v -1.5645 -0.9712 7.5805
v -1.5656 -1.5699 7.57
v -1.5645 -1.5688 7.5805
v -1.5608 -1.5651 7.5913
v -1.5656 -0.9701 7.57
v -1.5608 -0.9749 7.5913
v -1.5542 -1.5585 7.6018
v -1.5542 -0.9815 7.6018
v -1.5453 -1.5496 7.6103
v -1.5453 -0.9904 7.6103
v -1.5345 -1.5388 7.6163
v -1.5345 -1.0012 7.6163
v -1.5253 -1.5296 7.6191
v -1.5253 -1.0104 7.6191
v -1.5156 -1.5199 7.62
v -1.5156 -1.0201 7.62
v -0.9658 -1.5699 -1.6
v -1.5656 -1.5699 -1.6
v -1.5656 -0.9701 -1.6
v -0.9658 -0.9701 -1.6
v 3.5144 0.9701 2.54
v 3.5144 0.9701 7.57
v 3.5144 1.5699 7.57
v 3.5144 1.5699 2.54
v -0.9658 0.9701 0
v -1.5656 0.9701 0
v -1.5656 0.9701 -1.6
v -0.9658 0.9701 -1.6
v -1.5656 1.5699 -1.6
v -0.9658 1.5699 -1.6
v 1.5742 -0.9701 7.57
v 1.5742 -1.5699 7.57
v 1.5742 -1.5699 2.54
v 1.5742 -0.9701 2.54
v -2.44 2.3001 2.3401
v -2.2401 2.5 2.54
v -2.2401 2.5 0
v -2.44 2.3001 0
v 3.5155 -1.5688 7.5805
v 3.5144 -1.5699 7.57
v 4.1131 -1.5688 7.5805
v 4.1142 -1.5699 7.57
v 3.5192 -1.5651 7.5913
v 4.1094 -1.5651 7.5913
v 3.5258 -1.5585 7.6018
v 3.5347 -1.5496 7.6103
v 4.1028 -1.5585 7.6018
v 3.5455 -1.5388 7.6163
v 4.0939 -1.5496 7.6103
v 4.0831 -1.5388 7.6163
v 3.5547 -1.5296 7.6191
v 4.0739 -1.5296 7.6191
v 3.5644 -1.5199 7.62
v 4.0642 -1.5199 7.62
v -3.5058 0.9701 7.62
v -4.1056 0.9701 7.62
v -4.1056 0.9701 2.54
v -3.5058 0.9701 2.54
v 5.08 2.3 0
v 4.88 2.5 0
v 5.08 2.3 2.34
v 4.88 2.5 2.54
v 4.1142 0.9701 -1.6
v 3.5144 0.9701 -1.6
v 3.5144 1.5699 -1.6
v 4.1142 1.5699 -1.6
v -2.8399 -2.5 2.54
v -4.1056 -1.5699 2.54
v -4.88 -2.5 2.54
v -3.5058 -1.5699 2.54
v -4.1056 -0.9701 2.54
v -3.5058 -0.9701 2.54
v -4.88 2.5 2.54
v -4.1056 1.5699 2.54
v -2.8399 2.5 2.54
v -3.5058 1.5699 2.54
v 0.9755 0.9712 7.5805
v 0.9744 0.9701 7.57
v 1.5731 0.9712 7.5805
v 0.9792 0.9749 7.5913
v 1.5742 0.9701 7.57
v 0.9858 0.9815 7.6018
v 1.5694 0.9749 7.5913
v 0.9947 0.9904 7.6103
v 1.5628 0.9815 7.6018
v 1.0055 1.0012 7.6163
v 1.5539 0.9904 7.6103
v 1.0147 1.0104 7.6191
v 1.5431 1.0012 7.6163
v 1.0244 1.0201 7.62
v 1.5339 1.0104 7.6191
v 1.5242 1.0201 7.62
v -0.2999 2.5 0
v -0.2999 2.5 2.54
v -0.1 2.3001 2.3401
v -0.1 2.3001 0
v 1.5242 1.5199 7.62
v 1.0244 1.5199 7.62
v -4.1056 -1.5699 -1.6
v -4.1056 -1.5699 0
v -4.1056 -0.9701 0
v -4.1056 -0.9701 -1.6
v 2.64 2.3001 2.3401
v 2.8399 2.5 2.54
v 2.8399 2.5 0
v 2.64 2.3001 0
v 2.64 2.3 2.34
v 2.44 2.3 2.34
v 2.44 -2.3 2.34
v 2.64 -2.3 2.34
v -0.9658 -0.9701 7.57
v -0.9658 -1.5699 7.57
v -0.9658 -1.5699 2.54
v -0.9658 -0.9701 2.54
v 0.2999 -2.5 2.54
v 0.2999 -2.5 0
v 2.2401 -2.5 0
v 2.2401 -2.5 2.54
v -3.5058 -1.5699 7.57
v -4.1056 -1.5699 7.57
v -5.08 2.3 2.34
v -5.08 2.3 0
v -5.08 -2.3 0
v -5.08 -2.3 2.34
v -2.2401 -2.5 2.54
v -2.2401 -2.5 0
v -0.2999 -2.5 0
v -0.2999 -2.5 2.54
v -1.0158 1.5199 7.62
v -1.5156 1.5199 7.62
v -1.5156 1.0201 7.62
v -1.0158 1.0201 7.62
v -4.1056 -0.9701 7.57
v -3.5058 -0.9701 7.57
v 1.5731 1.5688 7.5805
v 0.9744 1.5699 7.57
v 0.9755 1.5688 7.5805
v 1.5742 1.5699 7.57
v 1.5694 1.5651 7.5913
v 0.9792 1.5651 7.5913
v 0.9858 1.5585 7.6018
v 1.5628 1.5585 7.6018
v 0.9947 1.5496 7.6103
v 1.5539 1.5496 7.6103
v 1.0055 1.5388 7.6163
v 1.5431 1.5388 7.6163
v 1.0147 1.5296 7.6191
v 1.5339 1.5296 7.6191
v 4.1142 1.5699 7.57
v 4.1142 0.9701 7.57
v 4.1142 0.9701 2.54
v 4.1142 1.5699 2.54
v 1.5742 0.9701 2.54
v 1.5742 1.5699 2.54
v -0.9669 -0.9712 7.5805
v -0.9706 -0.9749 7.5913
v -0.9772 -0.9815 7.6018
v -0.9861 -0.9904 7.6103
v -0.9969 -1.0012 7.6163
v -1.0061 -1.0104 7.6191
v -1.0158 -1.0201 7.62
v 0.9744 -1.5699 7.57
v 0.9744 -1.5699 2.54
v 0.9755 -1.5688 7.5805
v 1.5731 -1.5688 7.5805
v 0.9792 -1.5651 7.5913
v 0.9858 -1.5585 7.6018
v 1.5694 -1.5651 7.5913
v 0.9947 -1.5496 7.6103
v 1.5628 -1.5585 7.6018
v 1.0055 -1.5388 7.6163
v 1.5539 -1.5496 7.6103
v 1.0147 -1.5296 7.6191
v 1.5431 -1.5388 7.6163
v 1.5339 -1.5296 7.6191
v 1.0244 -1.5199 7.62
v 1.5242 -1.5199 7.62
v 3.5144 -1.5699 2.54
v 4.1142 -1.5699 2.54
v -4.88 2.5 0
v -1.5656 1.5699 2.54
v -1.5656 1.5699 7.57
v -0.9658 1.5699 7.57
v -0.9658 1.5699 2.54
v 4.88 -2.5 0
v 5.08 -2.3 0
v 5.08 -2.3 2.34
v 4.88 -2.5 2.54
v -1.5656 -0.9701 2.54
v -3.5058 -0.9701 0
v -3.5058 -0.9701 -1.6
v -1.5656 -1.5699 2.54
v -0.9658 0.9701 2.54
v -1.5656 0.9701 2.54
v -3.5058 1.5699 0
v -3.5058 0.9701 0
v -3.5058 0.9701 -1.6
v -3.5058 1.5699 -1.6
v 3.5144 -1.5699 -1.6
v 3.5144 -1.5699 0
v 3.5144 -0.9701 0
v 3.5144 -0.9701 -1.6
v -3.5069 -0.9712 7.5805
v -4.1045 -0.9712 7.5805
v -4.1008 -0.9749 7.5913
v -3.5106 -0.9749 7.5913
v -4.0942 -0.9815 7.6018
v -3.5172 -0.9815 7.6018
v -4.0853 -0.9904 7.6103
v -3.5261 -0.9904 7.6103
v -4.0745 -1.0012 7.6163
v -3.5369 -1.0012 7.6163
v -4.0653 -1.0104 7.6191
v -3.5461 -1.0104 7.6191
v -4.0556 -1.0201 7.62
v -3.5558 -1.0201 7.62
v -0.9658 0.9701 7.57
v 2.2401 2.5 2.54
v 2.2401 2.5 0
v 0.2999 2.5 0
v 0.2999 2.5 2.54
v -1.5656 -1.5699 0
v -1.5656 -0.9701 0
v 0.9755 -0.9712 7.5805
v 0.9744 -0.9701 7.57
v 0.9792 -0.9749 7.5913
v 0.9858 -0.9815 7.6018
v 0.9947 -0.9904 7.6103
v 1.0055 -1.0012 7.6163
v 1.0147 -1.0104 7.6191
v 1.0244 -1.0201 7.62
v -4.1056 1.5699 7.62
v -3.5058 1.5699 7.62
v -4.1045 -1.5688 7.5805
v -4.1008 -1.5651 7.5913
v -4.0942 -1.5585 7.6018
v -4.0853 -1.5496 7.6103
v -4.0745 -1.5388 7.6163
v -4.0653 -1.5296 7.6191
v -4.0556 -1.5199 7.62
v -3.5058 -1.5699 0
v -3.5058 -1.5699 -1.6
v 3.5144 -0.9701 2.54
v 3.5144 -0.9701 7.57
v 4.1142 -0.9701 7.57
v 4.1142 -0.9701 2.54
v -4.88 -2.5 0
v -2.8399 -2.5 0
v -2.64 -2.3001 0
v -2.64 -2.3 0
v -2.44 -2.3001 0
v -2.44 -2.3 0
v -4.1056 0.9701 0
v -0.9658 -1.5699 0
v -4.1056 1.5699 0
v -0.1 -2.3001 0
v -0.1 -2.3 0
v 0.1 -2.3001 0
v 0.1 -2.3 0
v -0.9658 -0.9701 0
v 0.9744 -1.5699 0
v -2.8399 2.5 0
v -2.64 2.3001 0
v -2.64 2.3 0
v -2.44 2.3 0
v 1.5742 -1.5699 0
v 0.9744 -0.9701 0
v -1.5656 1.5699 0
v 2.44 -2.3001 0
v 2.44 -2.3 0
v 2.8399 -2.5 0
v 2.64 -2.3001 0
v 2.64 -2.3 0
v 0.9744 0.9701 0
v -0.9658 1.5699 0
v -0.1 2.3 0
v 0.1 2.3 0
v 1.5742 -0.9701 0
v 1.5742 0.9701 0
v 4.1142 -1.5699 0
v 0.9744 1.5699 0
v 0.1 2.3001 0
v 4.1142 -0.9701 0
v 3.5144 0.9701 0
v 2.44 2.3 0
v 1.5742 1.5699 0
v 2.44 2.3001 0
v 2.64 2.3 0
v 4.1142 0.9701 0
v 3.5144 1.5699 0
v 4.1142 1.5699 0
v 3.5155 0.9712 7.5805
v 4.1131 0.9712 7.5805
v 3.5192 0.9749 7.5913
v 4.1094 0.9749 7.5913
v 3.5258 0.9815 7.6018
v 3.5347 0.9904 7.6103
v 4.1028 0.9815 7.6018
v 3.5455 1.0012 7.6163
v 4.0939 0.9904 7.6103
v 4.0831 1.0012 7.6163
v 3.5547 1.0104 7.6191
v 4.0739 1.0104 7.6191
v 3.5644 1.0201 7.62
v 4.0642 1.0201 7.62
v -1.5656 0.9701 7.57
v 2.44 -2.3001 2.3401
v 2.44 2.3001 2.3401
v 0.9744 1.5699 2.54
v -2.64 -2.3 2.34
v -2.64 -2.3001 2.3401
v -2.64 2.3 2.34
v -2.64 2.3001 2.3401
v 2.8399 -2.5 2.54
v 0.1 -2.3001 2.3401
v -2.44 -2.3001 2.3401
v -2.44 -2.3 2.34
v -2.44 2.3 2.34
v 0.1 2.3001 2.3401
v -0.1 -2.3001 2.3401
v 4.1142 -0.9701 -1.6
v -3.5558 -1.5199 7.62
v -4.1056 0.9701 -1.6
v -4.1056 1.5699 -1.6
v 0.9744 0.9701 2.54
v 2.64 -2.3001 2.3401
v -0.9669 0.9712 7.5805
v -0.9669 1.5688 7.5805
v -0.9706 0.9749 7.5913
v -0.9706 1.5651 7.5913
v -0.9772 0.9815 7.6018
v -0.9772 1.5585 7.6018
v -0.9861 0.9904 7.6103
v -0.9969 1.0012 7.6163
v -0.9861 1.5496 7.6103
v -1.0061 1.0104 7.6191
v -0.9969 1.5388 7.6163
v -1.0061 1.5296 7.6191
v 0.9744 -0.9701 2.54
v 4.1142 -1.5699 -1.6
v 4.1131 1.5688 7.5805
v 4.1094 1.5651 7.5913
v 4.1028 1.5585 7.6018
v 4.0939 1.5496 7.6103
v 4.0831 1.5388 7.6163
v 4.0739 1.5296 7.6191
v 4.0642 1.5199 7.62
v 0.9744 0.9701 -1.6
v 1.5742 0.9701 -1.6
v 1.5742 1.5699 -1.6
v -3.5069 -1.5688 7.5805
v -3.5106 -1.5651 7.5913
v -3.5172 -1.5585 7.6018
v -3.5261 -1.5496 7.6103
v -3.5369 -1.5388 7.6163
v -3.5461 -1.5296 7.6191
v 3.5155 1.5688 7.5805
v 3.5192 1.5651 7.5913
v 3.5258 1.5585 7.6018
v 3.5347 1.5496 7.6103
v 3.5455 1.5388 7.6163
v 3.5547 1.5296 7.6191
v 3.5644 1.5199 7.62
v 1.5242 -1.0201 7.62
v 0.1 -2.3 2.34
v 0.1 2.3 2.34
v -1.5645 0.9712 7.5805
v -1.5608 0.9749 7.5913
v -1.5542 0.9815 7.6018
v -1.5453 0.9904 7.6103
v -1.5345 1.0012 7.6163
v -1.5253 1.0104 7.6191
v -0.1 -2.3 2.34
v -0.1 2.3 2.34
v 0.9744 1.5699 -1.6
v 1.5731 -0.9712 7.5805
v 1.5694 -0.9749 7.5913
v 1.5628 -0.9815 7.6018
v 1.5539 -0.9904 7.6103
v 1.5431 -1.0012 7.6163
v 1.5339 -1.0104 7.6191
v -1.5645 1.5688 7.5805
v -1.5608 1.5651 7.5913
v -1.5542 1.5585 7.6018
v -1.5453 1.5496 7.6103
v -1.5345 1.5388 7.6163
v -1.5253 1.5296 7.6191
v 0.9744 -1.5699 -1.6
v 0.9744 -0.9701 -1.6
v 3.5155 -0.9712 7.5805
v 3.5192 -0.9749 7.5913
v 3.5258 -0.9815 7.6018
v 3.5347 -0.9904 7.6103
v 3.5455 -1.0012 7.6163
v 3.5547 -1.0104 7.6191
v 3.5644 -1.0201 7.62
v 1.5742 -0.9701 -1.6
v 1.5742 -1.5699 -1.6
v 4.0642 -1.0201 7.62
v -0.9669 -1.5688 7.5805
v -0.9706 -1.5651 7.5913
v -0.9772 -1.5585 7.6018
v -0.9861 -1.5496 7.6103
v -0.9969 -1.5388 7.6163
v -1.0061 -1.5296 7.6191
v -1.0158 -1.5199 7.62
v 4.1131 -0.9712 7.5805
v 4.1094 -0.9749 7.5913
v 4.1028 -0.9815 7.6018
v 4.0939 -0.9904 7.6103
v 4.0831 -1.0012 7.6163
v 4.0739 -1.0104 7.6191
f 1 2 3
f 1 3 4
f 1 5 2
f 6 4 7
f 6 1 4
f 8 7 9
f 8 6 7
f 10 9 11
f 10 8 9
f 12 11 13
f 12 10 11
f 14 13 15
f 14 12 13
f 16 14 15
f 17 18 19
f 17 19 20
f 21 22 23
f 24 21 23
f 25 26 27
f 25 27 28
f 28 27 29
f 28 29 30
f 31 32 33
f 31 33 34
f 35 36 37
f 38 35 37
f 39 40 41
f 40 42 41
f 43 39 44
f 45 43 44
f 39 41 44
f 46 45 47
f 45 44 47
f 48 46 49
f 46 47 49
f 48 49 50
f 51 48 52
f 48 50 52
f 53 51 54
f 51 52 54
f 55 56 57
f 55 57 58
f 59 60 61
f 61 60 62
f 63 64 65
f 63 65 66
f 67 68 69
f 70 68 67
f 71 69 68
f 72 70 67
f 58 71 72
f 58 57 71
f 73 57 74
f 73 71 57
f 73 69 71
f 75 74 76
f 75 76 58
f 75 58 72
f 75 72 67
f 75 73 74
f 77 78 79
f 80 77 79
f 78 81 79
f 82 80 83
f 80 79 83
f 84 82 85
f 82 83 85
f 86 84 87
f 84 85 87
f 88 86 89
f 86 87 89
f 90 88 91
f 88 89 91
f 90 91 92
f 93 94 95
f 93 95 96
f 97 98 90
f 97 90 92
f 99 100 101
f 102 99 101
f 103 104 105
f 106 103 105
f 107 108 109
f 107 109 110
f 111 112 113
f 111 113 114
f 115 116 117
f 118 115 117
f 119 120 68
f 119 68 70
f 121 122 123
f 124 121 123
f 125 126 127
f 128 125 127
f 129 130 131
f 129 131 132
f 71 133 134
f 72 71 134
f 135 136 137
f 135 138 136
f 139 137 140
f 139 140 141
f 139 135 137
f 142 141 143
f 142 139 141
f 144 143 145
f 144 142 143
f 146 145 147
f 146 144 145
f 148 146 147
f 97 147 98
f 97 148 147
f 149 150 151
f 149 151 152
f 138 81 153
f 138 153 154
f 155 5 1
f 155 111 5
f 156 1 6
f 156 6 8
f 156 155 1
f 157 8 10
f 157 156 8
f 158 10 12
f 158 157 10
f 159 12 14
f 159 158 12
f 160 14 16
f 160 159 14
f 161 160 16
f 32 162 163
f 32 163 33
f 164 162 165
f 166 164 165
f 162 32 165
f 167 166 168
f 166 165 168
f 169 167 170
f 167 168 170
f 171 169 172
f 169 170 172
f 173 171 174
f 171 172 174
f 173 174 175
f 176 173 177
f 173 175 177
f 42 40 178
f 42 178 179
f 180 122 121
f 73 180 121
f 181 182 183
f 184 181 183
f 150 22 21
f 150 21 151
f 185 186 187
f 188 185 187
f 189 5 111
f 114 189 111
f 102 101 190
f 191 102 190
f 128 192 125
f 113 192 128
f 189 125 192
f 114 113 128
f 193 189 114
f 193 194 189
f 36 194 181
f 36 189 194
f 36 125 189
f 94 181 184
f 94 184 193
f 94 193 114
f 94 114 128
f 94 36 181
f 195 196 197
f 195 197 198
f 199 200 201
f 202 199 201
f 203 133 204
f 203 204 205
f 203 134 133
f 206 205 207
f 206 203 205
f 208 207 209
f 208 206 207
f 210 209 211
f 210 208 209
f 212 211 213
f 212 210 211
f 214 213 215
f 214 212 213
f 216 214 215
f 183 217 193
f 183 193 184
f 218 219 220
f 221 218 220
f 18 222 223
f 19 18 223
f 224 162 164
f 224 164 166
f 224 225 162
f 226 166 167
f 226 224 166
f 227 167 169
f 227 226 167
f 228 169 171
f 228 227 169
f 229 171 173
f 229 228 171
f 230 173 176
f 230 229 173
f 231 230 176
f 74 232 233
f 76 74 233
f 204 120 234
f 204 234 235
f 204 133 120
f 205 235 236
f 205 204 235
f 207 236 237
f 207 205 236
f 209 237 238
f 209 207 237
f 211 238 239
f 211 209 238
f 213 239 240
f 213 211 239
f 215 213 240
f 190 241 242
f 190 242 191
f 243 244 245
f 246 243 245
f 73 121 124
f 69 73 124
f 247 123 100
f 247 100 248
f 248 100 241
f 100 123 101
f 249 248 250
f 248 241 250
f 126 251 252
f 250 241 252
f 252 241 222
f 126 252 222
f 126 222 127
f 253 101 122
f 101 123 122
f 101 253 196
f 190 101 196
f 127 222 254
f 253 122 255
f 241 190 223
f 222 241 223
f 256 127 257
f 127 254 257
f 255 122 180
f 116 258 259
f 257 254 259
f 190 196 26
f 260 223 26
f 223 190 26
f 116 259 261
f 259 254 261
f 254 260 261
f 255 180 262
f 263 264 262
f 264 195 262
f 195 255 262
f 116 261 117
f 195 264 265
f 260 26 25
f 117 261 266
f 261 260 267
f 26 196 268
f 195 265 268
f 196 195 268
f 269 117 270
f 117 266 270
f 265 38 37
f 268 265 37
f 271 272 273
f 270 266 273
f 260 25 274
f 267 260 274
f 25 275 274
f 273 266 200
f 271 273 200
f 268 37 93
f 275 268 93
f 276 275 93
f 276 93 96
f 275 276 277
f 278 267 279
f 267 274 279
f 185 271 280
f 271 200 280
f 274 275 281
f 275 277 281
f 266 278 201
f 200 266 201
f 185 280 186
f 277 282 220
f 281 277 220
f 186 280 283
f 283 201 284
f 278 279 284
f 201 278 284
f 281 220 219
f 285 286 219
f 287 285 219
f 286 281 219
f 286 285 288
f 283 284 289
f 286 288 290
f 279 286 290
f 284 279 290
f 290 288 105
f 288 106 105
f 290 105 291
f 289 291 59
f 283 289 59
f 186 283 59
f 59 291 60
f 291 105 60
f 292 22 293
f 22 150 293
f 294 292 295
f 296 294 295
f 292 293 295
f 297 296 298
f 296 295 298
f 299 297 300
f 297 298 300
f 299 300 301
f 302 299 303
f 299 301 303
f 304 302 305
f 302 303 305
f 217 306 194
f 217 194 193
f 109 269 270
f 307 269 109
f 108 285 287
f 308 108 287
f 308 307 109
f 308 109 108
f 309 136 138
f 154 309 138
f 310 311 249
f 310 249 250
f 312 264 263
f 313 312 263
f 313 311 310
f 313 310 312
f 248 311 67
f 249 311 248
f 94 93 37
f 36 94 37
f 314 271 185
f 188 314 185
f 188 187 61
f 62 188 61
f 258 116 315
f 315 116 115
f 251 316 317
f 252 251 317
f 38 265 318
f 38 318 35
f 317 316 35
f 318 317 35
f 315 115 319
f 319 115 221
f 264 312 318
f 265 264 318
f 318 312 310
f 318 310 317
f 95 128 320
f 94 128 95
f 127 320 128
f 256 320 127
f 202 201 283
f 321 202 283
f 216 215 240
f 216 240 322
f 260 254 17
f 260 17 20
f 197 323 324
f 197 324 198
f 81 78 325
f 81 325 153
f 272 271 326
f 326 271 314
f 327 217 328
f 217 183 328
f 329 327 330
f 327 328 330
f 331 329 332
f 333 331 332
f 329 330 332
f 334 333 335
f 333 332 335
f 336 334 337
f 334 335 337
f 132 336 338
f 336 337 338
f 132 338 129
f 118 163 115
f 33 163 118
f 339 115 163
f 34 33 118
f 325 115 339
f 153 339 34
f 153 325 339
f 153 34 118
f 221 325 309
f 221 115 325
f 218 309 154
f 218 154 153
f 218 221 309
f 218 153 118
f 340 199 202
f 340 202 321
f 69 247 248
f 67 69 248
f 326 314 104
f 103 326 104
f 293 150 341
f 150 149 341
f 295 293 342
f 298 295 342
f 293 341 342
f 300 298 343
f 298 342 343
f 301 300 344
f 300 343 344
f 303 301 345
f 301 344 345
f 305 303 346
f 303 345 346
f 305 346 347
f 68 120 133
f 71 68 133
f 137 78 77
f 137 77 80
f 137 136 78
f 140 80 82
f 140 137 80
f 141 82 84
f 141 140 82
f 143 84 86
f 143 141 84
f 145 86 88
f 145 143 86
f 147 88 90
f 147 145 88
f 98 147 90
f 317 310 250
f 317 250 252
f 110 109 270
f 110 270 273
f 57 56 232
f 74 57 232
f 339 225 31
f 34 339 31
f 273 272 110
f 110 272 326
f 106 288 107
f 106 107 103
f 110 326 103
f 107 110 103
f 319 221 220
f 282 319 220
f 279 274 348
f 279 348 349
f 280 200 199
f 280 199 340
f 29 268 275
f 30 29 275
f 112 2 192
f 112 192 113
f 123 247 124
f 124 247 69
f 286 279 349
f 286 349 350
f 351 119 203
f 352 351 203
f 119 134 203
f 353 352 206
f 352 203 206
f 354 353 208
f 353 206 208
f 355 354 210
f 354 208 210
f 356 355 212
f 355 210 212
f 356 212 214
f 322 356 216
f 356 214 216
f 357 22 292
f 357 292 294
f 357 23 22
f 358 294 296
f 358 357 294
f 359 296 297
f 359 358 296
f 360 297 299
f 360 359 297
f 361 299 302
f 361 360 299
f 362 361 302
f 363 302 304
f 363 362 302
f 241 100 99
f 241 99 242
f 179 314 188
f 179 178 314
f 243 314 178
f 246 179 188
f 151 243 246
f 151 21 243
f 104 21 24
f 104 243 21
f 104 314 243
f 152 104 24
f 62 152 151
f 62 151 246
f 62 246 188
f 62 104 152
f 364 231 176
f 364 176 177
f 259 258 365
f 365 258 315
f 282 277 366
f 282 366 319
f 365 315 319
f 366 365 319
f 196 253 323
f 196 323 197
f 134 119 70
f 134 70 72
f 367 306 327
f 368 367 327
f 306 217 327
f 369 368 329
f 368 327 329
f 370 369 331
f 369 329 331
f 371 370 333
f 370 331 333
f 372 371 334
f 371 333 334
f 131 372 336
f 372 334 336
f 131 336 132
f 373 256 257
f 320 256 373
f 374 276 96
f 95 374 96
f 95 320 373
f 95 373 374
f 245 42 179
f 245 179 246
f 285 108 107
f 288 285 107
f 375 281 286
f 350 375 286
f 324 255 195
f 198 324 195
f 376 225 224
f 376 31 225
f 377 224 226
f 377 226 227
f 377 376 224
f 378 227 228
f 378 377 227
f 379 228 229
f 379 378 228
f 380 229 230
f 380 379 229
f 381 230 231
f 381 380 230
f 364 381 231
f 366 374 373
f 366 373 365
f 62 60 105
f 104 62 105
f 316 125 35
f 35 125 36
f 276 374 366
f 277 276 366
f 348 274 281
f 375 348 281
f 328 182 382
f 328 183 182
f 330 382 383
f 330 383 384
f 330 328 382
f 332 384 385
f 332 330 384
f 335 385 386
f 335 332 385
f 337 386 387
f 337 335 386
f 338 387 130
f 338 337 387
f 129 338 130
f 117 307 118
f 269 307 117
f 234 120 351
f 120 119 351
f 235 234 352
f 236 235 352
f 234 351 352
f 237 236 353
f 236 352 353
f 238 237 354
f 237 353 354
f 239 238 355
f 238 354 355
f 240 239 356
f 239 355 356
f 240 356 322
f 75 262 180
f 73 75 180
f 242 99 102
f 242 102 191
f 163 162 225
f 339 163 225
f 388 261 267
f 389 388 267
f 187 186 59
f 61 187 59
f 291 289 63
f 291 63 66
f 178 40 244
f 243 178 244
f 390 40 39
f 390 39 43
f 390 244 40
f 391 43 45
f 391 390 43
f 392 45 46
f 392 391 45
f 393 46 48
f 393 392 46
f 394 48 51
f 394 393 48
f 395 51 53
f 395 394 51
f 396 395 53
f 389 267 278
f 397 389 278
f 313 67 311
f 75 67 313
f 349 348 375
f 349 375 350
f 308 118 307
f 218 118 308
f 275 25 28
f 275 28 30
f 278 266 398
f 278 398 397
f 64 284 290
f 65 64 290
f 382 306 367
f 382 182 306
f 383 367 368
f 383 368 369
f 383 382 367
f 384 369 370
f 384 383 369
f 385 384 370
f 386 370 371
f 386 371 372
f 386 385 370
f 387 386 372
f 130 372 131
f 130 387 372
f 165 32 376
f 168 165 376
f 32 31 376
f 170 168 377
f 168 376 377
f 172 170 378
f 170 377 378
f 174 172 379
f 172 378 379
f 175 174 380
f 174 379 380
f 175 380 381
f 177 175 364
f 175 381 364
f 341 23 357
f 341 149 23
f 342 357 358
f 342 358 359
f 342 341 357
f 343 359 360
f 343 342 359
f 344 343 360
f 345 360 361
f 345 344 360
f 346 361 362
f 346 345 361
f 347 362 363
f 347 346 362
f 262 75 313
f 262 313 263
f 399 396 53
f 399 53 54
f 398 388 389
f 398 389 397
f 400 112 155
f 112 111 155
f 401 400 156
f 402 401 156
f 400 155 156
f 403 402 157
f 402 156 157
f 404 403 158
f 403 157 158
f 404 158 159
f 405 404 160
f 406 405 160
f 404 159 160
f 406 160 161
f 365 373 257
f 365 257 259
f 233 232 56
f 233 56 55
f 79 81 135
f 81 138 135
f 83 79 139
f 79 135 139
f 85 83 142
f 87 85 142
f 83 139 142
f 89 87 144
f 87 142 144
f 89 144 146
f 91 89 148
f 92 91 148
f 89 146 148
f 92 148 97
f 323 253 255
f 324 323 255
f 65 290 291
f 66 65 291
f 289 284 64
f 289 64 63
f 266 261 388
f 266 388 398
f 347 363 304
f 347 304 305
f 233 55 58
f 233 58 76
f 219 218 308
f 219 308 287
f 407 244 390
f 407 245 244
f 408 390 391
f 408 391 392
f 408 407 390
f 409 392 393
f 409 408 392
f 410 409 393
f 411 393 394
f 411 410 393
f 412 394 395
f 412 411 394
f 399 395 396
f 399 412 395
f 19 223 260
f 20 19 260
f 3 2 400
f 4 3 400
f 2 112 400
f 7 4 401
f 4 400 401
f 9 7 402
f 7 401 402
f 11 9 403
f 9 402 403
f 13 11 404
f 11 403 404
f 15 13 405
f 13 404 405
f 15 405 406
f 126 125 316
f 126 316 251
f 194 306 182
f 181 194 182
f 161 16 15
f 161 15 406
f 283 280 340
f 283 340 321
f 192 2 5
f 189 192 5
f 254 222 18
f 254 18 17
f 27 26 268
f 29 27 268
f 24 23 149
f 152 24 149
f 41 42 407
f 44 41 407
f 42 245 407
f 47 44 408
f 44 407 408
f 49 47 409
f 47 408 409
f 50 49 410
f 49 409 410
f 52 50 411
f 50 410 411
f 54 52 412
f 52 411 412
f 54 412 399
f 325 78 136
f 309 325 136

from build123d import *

# Parameters (mm, degrees)
EXTRUDE_1_DEPTH             = 2.54
SKETCH_2_W                  = 0.599854391
SKETCH_2_H                  = 0.599854392
EXTRUDE_2_DEPTH             = 5.08
SKETCH_4_W                  = 0.2
SKETCH_4_H                  = 5
CUT_EXTRUDE_2_DEPTH         = 0.2
CUT_EXTRUDE_3_REACH         = 9.607
SKETCH_5_W                  = 0.2
SKETCH_5_H                  = 0.2
PATTERN_LINEAR_2_COUNT      = 3
PATTERN_LINEAR_2_PITCH      = 2.54
CHAMFER_1_SIZE              = 0.2
CHAMFER_2_SIZE              = 0.2
PATTERN_LINEAR_3_COUNT      = 4
PATTERN_LINEAR_3_PITCH      = 2.54
PATTERN_LINEAR_3_COUNT_DIR2 = 2
PATTERN_LINEAR_3_PITCH_DIR2 = 2.54
FILLET_4_R                  = 0.05
SKETCH_6_W                  = 13.31877373
SKETCH_6_H                  = 4.876948745
CUT_EXTRUDE_4_DEPTH         = 10


with BuildPart() as part:
    # 草图1 → 凸台-拉伸1 (new body)
    with BuildSketch(Plane.XY):
        Polygon((5.08, 2.5), (-5.08, 2.5), (-5.08, 0), (-5.08, -2.5), (5.08, -2.5), (5.08, 0), align=None)
    extrude(amount=EXTRUDE_1_DEPTH)

    # 草图2 → 凸台-拉伸2 (add, symmetric)
    with BuildSketch(Plane.XY.offset(2.54)):
        with Locations((-3.805698419, 1.27)):
            Rectangle(SKETCH_2_W, SKETCH_2_H)
    extrude_2 = extrude(amount=EXTRUDE_2_DEPTH, both=True)

    # 草图4 → 切除-拉伸2 (cut)
    with BuildSketch(Plane.XY.offset(2.54)):
        with Locations((-2.54, 0)):
            Rectangle(SKETCH_4_W, SKETCH_4_H)
    cut_extrude_2 = extrude(amount=-CUT_EXTRUDE_2_DEPTH, mode=Mode.SUBTRACT)

    # 草图5 → 切除-拉伸3 (cut, up to next)
    with BuildSketch(Plane.XY.offset(2.54), mode=Mode.PRIVATE) as cut_extrude_3_sk1:
        with Locations((-2.54, 2.4)):
            Rectangle(SKETCH_5_W, SKETCH_5_H)
    cut_extrude_3_tool1 = extrude(cut_extrude_3_sk1.sketch, amount=-CUT_EXTRUDE_3_REACH, mode=Mode.PRIVATE) & part.part
    # 草图5 → 切除-拉伸3 (cut, up to next)
    with BuildSketch(Plane.XY.offset(2.54), mode=Mode.PRIVATE) as cut_extrude_3_sk2:
        with Locations((-2.54, -2.4)):
            Rectangle(SKETCH_5_W, SKETCH_5_H)
    cut_extrude_3_tool2 = extrude(cut_extrude_3_sk2.sketch, amount=-CUT_EXTRUDE_3_REACH, mode=Mode.PRIVATE) & part.part
    cut_extrude_3_1 = cut_extrude_3_tool1.solids().sort_by_distance((-2.54, 2.4, 2.54))[0]
    add(cut_extrude_3_1, mode=Mode.SUBTRACT)
    cut_extrude_3_2 = cut_extrude_3_tool2.solids().sort_by_distance((-2.54, -2.4, 2.54))[0]
    add(cut_extrude_3_2, mode=Mode.SUBTRACT)
    cut_extrude_3 = cut_extrude_3_1 + cut_extrude_3_2  # 切除-拉伸3 as one shape, for the pattern or mirror that repeats it

    # 阵列(线性)2: 切除-拉伸2, 切除-拉伸3 ×3
    with Locations(*[(i * PATTERN_LINEAR_2_PITCH, 0, 0) for i in range(1, PATTERN_LINEAR_2_COUNT)]):
        add(cut_extrude_2, mode=Mode.SUBTRACT)
        add(cut_extrude_3, mode=Mode.SUBTRACT)

    # 倒角1
    chamfer_1_edges = [part.edges().sort_by_distance(p)[0] for p in [
        (5.08, -1.25, 2.54),
        (-5.08, 2.5, 1.27),
        (5.08, 2.5, 1.27),
        (5.08, -2.5, 1.27),
        (-5.08, -2.5, 1.27),
        (-5.08, -1.25, 2.54),
    ]]
    chamfer(chamfer_1_edges, length=CHAMFER_1_SIZE)

    # 倒角2
    chamfer_2_edges = [part.edges().sort_by_distance(p)[0] for p in [
        (-2.64, -2.5, 1.27),
        (2.44, -2.5, 1.27),
        (0.1, -2.5, 1.27),
        (2.64, -2.5, 1.27),
        (-0.1, -2.5, 1.27),
        (-2.44, -2.5, 1.27),
        (2.64, 0, 2.54),
        (-2.64, 0, 2.54),
        (-0.1, 0, 2.54),
        (-2.44, 0, 2.54),
        (2.44, 0, 2.54),
        (0.1, 0, 2.54),
        (2.64, 2.5, 1.27),
        (-0.1, 2.5, 1.27),
        (-2.44, 2.5, 1.27),
        (2.44, 2.5, 1.27),
        (0.1, 2.5, 1.27),
        (-2.64, 2.5, 1.27),
    ]]
    chamfer(chamfer_2_edges, length=CHAMFER_2_SIZE - 0.0001)  # a hair under: the kernel refuses the full size

    # 阵列(线性)3: Extrude 2 4 × 2
    with Locations(*[(i * PATTERN_LINEAR_3_PITCH, -j * PATTERN_LINEAR_3_PITCH_DIR2, 0) for i in range(PATTERN_LINEAR_3_COUNT) for j in range(PATTERN_LINEAR_3_COUNT_DIR2) if (i, j) != (0, 0)]):
        add(extrude_2)

    # 圆角4
    fillet_4_edges = [part.edges().sort_by_distance(p)[0] for p in [
        (-3.805698419, -0.970072804, -2.54),
        (-4.105625614, -1.27, -2.54),
        (-3.805698419, -1.569927196, -2.54),
        (-3.505771223, -1.27, -2.54),
        (-3.805698419, -0.970072804, 7.62),
        (-4.105625614, -1.27, 7.62),
        (-3.805698419, -1.569927196, 7.62),
        (-3.505771223, -1.27, 7.62),
        (-1.265698419, 1.569927196, -2.54),
        (-1.565625614, 1.27, -2.54),
        (-1.265698419, 0.970072804, -2.54),
        (-0.965771223, 1.27, -2.54),
        (-1.265698419, 1.569927196, 7.62),
        (-1.565625614, 1.27, 7.62),
        (-1.265698419, 0.970072804, 7.62),
        (-0.965771223, 1.27, 7.62),
        (-1.265698419, -0.970072804, -2.54),
        (-1.565625614, -1.27, -2.54),
        (-1.265698419, -1.569927196, -2.54),
        (-0.965771223, -1.27, -2.54),
        (-1.265698419, -0.970072804, 7.62),
        (-1.565625614, -1.27, 7.62),
        (-1.265698419, -1.569927196, 7.62),
        (-0.965771223, -1.27, 7.62),
        (1.274301581, 1.569927196, -2.54),
        (0.974374386, 1.27, -2.54),
        (1.274301581, 0.970072804, -2.54),
        (1.574228777, 1.27, -2.54),
        (1.274301581, 1.569927196, 7.62),
        (0.974374386, 1.27, 7.62),
        (1.274301581, 0.970072804, 7.62),
        (1.574228777, 1.27, 7.62),
        (1.274301581, -0.970072804, -2.54),
        (0.974374386, -1.27, -2.54),
        (1.274301581, -1.569927196, -2.54),
        (1.574228777, -1.27, -2.54),
        (1.274301581, -0.970072804, 7.62),
        (0.974374386, -1.27, 7.62),
        (1.274301581, -1.569927196, 7.62),
        (1.574228777, -1.27, 7.62),
        (3.814301581, 1.569927196, -2.54),
        (3.514374386, 1.27, -2.54),
        (3.814301581, 0.970072804, -2.54),
        (4.114228777, 1.27, -2.54),
        (3.814301581, 1.569927196, 7.62),
        (3.514374386, 1.27, 7.62),
        (3.814301581, 0.970072804, 7.62),
        (4.114228777, 1.27, 7.62),
        (3.814301581, -0.970072804, -2.54),
        (3.514374386, -1.27, -2.54),
        (3.814301581, -1.569927196, -2.54),
        (4.114228777, -1.27, -2.54),
        (3.814301581, -0.970072804, 7.62),
        (3.514374386, -1.27, 7.62),
        (3.814301581, -1.569927196, 7.62),
        (4.114228777, -1.27, 7.62),
    ]]
    fillet(fillet_4_edges, radius=FILLET_4_R)

    # 草图6 → 切除-拉伸4 (cut)
    with BuildSketch(Plane.XZ.offset(2.5)):
        with Locations((0.654637262, -4.038474373)):
            Rectangle(SKETCH_6_W, SKETCH_6_H)
    extrude(amount=-CUT_EXTRUDE_4_DEPTH, mode=Mode.SUBTRACT)


solid = part.part
